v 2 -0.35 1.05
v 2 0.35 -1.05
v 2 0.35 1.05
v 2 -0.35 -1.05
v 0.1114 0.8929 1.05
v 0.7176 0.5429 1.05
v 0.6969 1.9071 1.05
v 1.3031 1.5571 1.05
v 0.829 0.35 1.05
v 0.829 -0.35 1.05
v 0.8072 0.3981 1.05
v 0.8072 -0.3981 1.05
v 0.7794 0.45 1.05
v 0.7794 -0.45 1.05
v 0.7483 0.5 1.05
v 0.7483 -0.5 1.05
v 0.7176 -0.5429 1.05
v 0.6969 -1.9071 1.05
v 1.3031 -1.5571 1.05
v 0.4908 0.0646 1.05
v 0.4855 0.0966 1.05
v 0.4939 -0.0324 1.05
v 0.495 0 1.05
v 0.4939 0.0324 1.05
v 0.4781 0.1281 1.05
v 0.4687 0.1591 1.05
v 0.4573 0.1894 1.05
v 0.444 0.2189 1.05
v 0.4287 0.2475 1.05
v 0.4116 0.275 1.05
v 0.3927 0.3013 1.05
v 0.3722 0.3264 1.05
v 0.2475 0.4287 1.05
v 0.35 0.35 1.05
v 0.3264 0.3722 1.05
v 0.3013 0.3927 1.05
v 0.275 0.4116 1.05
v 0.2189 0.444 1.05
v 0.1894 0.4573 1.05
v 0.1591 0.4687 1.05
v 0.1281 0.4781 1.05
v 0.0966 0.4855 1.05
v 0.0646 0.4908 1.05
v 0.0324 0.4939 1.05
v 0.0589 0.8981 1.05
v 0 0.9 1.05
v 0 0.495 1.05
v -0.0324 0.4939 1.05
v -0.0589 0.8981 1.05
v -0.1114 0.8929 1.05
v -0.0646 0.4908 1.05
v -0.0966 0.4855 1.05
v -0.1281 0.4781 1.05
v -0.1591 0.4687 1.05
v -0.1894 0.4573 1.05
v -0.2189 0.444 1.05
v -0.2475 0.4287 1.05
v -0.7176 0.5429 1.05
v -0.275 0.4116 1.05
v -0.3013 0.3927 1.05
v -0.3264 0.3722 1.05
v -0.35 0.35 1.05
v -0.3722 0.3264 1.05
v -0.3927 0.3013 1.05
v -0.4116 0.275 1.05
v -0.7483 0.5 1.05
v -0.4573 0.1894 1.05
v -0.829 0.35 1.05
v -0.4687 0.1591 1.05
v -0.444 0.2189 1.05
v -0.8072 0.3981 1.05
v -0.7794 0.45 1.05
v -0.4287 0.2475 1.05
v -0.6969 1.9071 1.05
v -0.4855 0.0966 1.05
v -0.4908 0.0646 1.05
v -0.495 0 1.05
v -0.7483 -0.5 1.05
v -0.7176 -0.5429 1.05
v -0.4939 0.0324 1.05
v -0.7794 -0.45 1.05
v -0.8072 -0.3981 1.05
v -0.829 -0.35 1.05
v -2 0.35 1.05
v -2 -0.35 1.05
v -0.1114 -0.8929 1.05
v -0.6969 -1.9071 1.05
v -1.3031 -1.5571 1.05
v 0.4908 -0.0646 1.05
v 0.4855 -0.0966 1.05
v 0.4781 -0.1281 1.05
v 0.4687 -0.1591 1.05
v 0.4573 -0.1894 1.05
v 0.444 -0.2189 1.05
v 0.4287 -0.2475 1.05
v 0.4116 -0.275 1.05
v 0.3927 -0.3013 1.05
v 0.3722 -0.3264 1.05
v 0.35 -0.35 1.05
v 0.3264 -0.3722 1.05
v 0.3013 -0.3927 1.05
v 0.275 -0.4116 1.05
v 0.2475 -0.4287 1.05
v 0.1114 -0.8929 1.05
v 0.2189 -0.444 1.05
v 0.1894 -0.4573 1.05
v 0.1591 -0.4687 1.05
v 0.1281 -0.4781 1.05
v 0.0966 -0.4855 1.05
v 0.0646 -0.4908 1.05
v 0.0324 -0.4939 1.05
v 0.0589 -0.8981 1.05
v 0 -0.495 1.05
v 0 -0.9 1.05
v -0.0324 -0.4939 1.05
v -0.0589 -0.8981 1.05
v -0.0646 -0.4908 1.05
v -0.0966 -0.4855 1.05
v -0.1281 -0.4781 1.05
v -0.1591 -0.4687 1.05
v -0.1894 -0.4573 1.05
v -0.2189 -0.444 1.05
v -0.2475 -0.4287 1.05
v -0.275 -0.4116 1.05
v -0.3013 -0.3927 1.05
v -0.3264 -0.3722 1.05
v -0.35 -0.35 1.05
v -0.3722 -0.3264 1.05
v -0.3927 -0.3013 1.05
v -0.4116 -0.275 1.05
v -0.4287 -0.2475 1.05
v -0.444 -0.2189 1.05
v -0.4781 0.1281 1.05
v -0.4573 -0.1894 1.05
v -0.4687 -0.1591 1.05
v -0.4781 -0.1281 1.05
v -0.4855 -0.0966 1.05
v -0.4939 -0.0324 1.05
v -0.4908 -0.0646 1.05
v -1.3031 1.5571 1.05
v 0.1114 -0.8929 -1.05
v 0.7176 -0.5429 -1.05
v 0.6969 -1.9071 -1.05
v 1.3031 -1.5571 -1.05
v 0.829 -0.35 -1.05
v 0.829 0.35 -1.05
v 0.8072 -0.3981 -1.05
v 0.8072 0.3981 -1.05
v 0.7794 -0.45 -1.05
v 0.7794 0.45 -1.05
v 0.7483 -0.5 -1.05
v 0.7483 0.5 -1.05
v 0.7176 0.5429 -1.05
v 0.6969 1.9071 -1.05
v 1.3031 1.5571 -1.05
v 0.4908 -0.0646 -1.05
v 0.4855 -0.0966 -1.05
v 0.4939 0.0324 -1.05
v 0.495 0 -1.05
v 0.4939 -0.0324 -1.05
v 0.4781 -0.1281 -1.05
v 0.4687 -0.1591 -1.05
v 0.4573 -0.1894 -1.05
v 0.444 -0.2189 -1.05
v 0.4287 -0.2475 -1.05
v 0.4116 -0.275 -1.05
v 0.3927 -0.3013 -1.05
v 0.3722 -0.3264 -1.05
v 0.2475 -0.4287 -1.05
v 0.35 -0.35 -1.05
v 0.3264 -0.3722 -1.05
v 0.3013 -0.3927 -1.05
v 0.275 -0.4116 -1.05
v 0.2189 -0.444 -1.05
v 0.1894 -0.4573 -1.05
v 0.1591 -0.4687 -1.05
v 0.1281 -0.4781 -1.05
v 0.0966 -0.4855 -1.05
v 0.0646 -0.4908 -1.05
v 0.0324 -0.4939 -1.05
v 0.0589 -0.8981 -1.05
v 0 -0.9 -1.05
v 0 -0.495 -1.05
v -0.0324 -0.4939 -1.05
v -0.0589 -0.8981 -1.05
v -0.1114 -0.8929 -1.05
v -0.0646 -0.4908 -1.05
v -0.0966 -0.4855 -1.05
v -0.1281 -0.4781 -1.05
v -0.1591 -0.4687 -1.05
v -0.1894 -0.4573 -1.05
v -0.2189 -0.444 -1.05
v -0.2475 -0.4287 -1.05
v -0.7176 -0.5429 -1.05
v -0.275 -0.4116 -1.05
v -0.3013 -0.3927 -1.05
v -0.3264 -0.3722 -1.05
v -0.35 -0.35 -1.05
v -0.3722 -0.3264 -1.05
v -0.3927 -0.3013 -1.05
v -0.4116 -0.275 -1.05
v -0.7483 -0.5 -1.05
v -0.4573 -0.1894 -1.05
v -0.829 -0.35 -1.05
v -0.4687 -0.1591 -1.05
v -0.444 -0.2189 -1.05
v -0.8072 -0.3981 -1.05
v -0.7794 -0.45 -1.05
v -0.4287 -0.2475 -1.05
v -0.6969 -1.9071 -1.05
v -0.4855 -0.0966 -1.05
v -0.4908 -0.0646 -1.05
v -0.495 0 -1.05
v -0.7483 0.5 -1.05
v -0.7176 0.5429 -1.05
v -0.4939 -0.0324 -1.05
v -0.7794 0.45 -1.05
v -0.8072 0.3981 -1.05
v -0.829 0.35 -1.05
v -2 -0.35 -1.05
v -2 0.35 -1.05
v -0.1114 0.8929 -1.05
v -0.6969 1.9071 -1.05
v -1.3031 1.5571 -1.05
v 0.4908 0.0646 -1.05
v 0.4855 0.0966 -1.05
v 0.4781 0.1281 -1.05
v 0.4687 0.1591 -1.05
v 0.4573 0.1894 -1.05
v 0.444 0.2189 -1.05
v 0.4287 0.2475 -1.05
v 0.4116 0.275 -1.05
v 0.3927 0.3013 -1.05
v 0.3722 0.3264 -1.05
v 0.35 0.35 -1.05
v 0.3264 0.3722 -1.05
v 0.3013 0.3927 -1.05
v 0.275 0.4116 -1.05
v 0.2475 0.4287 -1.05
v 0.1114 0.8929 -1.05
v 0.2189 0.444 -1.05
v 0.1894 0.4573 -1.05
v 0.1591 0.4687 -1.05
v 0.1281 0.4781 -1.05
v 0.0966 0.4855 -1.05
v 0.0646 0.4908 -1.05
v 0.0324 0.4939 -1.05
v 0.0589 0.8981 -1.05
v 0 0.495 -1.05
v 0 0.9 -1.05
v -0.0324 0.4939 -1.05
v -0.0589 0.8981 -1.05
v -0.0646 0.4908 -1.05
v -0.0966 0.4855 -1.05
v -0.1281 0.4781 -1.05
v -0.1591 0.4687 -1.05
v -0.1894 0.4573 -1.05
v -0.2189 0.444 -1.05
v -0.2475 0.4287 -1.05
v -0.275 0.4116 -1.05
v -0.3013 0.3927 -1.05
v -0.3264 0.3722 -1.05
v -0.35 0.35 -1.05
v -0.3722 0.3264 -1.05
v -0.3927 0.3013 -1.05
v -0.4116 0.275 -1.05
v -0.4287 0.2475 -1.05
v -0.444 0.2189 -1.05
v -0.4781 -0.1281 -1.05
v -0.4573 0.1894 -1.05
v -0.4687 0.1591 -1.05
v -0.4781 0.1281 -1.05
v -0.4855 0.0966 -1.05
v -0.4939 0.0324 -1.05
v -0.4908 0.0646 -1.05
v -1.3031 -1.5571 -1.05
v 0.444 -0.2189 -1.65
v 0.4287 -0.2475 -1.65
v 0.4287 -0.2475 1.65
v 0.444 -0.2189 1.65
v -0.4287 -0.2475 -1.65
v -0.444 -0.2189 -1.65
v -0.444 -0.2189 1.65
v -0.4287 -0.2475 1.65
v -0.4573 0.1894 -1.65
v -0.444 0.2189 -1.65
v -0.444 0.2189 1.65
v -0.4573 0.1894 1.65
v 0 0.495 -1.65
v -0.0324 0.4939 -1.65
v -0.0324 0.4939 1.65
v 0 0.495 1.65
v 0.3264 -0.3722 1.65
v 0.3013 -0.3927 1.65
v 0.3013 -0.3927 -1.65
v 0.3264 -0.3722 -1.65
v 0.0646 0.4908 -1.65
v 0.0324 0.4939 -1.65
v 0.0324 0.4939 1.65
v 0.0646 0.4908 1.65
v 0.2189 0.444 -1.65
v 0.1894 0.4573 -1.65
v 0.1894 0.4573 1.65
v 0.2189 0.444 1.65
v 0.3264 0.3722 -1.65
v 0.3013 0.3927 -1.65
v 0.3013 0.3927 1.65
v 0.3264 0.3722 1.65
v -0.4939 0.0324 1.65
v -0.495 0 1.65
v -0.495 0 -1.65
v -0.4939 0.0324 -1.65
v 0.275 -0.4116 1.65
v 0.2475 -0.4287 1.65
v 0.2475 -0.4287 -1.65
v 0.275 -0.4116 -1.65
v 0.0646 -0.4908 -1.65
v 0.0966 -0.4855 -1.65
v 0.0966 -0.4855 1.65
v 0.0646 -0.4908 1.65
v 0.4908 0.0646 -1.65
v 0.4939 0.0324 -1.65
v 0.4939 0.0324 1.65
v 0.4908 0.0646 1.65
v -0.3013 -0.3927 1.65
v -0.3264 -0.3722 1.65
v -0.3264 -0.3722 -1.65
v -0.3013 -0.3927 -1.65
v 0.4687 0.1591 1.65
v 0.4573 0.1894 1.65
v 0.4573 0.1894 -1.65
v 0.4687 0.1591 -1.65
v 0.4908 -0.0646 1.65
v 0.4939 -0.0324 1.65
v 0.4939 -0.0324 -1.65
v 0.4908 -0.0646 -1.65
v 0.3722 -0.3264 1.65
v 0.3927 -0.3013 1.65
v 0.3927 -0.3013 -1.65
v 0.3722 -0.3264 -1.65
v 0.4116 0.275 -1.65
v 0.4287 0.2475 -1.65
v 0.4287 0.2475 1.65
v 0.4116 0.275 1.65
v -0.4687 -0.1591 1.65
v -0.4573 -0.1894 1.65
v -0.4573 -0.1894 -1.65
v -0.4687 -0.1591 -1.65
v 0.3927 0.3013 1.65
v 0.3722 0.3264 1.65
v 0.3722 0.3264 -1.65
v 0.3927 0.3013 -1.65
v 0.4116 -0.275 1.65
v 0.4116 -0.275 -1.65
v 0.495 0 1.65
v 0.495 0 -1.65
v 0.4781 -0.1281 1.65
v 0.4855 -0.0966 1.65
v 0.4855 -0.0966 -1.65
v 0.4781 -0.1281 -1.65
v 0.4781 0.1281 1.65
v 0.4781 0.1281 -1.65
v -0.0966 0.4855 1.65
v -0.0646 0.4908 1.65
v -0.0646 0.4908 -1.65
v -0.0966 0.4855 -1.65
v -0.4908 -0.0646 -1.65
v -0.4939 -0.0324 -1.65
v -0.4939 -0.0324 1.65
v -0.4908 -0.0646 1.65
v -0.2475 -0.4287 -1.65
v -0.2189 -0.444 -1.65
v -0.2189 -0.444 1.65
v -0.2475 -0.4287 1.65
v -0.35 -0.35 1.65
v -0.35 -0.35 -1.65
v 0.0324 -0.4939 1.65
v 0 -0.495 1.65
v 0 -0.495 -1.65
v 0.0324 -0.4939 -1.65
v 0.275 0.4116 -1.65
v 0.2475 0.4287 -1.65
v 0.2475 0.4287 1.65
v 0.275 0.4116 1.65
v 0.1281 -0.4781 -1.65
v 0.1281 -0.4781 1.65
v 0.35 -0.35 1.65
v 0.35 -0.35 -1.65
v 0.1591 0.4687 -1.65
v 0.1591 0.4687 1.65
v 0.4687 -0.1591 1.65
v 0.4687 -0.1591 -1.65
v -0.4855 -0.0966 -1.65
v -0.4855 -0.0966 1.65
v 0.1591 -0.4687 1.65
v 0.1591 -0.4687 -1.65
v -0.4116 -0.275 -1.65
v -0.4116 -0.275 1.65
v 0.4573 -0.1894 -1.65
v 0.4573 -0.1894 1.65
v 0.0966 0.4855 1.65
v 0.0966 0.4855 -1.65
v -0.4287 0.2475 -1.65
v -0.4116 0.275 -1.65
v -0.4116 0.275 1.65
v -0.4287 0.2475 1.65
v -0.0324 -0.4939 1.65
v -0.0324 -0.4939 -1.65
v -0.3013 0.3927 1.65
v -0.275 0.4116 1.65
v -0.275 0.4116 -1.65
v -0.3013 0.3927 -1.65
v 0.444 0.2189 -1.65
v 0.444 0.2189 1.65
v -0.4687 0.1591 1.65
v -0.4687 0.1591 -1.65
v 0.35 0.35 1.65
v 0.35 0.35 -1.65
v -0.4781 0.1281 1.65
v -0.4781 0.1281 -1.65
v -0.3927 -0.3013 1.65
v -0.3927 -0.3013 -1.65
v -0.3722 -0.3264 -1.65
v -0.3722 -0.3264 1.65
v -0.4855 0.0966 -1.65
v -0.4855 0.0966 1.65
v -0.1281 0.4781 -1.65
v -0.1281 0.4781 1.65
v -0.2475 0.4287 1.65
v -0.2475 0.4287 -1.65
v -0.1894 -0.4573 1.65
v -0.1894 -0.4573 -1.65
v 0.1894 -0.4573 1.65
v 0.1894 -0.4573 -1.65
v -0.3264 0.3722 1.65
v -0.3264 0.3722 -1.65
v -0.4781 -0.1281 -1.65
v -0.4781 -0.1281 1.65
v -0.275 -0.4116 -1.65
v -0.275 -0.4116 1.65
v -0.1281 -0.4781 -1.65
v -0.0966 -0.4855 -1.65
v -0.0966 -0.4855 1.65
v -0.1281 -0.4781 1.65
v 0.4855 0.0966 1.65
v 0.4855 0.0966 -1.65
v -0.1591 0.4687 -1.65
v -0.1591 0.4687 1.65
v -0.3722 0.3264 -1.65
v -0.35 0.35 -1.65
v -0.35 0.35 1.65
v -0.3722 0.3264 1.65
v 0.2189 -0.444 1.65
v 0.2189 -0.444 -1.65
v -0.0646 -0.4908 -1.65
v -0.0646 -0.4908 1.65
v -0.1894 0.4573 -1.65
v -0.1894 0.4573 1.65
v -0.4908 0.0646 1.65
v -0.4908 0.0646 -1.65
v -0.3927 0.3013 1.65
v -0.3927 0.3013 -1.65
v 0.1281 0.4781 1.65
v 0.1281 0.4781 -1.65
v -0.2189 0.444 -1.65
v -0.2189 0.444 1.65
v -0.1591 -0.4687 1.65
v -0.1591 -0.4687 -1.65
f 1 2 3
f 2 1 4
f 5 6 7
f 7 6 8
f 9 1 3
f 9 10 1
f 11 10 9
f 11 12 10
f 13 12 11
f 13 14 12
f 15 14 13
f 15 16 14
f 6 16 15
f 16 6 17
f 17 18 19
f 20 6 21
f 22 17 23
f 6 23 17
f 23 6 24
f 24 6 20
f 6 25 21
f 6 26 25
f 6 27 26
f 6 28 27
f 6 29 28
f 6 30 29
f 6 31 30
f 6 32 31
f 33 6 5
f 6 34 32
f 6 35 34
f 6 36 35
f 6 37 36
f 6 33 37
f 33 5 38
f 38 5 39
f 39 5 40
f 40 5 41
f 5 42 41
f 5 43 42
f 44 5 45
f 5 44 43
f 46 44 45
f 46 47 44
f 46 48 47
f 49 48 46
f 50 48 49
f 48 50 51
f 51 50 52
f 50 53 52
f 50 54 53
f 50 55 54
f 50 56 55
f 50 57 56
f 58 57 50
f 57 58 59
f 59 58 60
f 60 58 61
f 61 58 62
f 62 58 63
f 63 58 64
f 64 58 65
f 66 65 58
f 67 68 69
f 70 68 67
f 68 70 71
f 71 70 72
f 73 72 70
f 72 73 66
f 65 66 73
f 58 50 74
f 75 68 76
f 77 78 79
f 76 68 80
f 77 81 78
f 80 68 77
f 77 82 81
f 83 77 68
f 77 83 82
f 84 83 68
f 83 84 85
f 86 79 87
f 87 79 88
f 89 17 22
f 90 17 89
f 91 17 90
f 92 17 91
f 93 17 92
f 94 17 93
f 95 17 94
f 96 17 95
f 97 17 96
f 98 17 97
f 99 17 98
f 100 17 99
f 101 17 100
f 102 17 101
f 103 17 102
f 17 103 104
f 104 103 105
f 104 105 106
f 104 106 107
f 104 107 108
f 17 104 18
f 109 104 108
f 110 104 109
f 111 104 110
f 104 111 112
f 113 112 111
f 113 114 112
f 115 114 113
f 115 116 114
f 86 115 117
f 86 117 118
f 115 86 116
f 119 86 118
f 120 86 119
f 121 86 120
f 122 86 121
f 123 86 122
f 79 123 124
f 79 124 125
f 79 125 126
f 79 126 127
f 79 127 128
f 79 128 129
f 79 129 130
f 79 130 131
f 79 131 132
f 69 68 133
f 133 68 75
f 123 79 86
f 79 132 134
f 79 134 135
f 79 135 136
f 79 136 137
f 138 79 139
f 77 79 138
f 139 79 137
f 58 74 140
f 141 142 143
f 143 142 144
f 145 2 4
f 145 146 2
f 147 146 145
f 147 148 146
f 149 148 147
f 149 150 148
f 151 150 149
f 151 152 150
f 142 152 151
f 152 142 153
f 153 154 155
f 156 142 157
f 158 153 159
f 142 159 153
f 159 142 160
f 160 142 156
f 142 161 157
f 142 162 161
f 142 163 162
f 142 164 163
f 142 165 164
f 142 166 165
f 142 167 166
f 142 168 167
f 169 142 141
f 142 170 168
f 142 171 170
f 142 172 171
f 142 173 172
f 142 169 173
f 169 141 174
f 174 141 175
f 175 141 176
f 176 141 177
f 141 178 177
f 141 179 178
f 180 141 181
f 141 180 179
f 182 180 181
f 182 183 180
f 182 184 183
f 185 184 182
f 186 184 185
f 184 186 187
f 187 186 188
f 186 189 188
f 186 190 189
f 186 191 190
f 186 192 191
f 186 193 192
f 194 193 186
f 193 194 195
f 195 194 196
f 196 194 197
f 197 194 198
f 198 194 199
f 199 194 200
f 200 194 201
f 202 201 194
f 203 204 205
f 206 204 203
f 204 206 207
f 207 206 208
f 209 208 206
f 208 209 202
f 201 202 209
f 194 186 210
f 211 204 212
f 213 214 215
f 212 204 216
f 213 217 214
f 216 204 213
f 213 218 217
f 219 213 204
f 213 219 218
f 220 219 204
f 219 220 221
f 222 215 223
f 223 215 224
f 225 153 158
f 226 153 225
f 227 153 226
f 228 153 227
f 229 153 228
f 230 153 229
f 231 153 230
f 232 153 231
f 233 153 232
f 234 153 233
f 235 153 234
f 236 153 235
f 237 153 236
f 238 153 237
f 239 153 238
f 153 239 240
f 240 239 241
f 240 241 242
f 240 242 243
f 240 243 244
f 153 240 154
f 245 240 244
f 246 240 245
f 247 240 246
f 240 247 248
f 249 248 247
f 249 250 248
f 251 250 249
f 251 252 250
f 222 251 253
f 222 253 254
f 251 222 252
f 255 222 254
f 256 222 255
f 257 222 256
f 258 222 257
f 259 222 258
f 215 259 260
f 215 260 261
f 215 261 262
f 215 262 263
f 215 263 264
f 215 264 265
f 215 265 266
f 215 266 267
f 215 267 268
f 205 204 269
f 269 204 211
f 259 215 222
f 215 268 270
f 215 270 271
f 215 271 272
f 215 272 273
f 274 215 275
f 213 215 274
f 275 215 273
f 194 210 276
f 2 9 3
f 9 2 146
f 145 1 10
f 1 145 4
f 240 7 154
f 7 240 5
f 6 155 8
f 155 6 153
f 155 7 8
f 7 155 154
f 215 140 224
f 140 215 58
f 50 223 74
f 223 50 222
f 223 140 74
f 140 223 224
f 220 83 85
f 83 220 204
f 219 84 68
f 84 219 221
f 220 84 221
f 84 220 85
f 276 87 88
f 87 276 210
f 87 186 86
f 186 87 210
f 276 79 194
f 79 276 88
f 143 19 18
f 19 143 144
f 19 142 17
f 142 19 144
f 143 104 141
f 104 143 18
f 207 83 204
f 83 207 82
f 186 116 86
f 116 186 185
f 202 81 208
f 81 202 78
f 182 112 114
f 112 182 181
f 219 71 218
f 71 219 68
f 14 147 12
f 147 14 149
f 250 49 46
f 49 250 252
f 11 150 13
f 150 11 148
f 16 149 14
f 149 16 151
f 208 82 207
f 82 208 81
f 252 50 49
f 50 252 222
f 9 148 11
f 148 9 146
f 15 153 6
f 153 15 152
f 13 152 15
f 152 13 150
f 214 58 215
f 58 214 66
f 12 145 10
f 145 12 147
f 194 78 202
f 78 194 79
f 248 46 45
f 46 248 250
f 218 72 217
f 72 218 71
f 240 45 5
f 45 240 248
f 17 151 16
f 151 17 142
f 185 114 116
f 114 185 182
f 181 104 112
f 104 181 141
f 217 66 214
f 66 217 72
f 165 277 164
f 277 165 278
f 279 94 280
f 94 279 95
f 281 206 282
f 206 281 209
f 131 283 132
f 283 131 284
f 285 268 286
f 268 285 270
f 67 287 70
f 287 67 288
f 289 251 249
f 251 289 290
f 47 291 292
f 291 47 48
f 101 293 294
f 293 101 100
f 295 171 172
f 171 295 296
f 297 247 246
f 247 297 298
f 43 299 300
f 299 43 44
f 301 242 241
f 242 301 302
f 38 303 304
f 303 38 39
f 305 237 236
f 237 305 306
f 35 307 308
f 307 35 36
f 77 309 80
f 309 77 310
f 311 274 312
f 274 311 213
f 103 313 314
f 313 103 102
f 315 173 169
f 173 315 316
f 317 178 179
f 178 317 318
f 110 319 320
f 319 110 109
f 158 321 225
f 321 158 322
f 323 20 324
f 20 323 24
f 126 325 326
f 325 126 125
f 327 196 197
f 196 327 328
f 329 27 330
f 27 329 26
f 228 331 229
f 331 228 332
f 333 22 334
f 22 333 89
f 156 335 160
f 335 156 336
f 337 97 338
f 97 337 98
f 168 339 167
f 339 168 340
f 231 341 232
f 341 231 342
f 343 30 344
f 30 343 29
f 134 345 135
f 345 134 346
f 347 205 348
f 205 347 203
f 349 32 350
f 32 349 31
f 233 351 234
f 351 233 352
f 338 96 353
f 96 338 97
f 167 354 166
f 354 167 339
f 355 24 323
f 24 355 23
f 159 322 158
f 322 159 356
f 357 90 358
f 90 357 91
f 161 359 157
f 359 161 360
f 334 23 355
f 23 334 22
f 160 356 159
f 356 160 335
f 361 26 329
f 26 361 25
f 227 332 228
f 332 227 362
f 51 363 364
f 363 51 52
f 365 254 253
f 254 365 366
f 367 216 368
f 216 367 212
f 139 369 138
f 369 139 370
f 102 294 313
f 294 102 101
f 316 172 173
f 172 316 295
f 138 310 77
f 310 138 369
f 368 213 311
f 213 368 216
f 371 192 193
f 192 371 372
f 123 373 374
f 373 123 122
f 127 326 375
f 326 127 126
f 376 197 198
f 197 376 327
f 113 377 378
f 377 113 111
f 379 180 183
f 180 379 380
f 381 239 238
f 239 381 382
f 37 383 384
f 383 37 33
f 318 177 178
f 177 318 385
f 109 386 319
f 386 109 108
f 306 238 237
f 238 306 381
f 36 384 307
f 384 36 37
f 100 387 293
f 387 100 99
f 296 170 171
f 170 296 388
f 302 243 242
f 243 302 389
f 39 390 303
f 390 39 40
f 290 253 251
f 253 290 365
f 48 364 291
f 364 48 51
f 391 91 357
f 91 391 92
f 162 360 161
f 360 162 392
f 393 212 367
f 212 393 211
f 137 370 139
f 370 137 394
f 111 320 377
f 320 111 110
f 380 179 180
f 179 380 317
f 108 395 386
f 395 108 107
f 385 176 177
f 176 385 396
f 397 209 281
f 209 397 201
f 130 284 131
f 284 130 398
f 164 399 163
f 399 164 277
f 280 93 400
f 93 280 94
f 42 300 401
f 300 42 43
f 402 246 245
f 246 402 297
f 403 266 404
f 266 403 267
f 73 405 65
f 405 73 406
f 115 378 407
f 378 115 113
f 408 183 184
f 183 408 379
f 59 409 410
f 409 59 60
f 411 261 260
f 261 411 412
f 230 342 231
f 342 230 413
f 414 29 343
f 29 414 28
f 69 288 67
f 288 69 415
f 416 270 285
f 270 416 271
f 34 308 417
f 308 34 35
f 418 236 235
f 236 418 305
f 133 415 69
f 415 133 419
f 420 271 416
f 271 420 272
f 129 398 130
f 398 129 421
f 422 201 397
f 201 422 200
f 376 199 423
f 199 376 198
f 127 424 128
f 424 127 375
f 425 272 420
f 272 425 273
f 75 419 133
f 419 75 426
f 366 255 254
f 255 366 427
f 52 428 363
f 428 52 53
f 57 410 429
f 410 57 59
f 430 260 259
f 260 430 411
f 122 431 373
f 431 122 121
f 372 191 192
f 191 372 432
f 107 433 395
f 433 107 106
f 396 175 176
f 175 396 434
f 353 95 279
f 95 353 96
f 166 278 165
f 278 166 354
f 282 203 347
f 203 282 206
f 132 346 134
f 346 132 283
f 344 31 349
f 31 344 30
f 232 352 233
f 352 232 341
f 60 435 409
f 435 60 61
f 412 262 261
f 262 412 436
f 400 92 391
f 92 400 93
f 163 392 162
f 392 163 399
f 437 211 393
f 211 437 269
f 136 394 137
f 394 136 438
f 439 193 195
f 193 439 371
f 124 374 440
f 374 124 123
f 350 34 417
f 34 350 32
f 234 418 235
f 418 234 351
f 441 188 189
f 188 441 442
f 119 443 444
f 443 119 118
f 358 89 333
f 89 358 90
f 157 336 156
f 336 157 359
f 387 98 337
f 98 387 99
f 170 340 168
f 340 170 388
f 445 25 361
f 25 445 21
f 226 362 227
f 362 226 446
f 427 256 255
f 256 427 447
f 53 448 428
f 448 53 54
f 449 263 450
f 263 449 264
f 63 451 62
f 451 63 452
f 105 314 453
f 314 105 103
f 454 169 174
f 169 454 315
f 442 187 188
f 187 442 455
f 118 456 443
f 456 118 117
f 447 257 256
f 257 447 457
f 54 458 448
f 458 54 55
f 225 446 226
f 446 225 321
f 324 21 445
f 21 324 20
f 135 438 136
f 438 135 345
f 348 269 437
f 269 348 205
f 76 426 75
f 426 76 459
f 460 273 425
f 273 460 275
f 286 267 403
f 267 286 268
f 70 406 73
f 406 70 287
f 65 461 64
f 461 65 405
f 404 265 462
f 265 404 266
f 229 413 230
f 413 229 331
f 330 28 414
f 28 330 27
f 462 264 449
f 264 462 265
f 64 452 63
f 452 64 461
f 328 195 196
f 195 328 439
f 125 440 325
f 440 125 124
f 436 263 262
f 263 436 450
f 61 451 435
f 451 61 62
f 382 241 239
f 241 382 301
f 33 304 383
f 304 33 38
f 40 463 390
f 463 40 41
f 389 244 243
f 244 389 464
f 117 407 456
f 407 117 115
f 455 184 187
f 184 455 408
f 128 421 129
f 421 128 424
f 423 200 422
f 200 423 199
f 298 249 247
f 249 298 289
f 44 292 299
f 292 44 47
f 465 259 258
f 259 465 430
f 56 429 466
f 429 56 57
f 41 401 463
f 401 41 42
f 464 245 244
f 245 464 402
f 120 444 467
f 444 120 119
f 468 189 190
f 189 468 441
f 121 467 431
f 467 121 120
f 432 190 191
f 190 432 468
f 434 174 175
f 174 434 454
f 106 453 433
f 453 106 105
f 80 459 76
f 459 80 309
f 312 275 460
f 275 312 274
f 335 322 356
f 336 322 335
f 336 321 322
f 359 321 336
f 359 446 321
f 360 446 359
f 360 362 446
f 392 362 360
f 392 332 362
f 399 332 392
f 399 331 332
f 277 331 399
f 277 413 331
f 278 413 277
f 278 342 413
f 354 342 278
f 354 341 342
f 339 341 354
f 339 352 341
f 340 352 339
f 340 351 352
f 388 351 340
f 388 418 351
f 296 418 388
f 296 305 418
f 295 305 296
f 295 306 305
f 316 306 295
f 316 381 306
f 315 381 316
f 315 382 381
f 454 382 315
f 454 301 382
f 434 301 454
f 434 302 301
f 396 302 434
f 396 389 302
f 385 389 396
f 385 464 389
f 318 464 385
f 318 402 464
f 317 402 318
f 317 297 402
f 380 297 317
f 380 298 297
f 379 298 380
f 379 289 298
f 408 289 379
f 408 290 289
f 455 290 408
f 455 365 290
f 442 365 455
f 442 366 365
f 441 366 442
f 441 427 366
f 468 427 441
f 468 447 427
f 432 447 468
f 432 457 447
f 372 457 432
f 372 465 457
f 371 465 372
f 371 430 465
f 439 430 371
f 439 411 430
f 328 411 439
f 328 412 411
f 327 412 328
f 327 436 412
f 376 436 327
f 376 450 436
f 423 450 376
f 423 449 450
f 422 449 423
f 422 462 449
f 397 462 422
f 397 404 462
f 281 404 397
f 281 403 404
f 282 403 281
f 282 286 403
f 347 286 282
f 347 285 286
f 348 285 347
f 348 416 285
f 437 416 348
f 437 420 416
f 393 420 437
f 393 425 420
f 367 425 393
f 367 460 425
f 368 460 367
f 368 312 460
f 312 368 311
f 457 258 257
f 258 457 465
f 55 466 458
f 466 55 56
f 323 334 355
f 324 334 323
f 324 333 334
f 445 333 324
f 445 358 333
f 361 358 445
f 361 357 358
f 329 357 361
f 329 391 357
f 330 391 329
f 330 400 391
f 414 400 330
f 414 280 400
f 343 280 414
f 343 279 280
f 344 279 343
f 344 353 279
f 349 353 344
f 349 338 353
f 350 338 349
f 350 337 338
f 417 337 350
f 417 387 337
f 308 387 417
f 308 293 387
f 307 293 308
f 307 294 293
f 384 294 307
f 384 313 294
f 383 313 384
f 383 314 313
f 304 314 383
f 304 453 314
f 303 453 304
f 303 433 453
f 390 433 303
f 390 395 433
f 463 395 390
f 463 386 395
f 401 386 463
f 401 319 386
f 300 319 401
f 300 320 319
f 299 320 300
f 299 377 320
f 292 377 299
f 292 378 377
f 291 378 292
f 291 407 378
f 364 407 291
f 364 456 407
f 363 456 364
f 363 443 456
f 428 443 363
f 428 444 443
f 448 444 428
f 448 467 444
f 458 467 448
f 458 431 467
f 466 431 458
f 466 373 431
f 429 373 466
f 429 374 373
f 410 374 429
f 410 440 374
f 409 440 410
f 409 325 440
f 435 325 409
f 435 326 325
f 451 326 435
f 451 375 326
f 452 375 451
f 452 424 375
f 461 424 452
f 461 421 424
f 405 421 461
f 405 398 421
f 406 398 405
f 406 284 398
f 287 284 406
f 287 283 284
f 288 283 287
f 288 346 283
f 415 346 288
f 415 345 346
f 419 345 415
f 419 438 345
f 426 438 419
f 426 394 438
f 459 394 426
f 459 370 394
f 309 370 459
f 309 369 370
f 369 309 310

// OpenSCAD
// Radial configuration: [2.0, 0, 6]
// Goal: a clear 6-fold radial pattern (in XY) with consistent arms/spacing,
// and NO dominating tall off-axis shaft. ONE connected solid.

radial_x = 2.0; //[1.0:4.0:0.1]
radial_y = 0.0; //[-2.0:2.0:0.1]
radial_z = 6.0; //[3.0:12.0:0.1]

connect_overlap = 0.8; //[0.5:2.0:0.1]

$fn = 96;

function vlen(x,y,z) = sqrt(x*x + y*y + z*z);

// 6-fold radial object derived from [x,y,z]:
// - radius comes from XY magnitude (here 2.0)
// - thickness/height comes from Z (here 6.0)
module radial_6fold(x, y, z) {
  r_xy = max(0.01, vlen(x, y, 0));
  h = max(1.0, abs(z));

  // Hub and arms sized from r_xy and h
  hub_r = max(0.6, r_xy * 0.45);
  hub_h = max(1.0, h * 0.35);

  arm_len = max(0.8, r_xy * 0.95);
  arm_w   = max(0.5, r_xy * 0.35);
  arm_h   = max(hub_h, h * 0.35);

  // Ensure arms overlap into hub for connectivity
  overlap = min(connect_overlap, hub_r * 0.9);

  union() {
    // Central hub
    cylinder(r=hub_r, h=hub_h, center=true);

    // 6 arms in XY plane
    for (i = [0:5]) {
      rotate([0,0,i*360/6])
        translate([hub_r + arm_len/2 - overlap, 0, 0])
          cube([arm_len, arm_w, arm_h], center=true);
    }

    // Small center boss to emphasize axis without creating a tall shaft
    boss_r = hub_r * 0.55;
    boss_h = max(hub_h, h * 0.55);
    cylinder(r=boss_r, h=boss_h, center=true);
  }
}

radial_6fold(radial_x, radial_y, radial_z);
